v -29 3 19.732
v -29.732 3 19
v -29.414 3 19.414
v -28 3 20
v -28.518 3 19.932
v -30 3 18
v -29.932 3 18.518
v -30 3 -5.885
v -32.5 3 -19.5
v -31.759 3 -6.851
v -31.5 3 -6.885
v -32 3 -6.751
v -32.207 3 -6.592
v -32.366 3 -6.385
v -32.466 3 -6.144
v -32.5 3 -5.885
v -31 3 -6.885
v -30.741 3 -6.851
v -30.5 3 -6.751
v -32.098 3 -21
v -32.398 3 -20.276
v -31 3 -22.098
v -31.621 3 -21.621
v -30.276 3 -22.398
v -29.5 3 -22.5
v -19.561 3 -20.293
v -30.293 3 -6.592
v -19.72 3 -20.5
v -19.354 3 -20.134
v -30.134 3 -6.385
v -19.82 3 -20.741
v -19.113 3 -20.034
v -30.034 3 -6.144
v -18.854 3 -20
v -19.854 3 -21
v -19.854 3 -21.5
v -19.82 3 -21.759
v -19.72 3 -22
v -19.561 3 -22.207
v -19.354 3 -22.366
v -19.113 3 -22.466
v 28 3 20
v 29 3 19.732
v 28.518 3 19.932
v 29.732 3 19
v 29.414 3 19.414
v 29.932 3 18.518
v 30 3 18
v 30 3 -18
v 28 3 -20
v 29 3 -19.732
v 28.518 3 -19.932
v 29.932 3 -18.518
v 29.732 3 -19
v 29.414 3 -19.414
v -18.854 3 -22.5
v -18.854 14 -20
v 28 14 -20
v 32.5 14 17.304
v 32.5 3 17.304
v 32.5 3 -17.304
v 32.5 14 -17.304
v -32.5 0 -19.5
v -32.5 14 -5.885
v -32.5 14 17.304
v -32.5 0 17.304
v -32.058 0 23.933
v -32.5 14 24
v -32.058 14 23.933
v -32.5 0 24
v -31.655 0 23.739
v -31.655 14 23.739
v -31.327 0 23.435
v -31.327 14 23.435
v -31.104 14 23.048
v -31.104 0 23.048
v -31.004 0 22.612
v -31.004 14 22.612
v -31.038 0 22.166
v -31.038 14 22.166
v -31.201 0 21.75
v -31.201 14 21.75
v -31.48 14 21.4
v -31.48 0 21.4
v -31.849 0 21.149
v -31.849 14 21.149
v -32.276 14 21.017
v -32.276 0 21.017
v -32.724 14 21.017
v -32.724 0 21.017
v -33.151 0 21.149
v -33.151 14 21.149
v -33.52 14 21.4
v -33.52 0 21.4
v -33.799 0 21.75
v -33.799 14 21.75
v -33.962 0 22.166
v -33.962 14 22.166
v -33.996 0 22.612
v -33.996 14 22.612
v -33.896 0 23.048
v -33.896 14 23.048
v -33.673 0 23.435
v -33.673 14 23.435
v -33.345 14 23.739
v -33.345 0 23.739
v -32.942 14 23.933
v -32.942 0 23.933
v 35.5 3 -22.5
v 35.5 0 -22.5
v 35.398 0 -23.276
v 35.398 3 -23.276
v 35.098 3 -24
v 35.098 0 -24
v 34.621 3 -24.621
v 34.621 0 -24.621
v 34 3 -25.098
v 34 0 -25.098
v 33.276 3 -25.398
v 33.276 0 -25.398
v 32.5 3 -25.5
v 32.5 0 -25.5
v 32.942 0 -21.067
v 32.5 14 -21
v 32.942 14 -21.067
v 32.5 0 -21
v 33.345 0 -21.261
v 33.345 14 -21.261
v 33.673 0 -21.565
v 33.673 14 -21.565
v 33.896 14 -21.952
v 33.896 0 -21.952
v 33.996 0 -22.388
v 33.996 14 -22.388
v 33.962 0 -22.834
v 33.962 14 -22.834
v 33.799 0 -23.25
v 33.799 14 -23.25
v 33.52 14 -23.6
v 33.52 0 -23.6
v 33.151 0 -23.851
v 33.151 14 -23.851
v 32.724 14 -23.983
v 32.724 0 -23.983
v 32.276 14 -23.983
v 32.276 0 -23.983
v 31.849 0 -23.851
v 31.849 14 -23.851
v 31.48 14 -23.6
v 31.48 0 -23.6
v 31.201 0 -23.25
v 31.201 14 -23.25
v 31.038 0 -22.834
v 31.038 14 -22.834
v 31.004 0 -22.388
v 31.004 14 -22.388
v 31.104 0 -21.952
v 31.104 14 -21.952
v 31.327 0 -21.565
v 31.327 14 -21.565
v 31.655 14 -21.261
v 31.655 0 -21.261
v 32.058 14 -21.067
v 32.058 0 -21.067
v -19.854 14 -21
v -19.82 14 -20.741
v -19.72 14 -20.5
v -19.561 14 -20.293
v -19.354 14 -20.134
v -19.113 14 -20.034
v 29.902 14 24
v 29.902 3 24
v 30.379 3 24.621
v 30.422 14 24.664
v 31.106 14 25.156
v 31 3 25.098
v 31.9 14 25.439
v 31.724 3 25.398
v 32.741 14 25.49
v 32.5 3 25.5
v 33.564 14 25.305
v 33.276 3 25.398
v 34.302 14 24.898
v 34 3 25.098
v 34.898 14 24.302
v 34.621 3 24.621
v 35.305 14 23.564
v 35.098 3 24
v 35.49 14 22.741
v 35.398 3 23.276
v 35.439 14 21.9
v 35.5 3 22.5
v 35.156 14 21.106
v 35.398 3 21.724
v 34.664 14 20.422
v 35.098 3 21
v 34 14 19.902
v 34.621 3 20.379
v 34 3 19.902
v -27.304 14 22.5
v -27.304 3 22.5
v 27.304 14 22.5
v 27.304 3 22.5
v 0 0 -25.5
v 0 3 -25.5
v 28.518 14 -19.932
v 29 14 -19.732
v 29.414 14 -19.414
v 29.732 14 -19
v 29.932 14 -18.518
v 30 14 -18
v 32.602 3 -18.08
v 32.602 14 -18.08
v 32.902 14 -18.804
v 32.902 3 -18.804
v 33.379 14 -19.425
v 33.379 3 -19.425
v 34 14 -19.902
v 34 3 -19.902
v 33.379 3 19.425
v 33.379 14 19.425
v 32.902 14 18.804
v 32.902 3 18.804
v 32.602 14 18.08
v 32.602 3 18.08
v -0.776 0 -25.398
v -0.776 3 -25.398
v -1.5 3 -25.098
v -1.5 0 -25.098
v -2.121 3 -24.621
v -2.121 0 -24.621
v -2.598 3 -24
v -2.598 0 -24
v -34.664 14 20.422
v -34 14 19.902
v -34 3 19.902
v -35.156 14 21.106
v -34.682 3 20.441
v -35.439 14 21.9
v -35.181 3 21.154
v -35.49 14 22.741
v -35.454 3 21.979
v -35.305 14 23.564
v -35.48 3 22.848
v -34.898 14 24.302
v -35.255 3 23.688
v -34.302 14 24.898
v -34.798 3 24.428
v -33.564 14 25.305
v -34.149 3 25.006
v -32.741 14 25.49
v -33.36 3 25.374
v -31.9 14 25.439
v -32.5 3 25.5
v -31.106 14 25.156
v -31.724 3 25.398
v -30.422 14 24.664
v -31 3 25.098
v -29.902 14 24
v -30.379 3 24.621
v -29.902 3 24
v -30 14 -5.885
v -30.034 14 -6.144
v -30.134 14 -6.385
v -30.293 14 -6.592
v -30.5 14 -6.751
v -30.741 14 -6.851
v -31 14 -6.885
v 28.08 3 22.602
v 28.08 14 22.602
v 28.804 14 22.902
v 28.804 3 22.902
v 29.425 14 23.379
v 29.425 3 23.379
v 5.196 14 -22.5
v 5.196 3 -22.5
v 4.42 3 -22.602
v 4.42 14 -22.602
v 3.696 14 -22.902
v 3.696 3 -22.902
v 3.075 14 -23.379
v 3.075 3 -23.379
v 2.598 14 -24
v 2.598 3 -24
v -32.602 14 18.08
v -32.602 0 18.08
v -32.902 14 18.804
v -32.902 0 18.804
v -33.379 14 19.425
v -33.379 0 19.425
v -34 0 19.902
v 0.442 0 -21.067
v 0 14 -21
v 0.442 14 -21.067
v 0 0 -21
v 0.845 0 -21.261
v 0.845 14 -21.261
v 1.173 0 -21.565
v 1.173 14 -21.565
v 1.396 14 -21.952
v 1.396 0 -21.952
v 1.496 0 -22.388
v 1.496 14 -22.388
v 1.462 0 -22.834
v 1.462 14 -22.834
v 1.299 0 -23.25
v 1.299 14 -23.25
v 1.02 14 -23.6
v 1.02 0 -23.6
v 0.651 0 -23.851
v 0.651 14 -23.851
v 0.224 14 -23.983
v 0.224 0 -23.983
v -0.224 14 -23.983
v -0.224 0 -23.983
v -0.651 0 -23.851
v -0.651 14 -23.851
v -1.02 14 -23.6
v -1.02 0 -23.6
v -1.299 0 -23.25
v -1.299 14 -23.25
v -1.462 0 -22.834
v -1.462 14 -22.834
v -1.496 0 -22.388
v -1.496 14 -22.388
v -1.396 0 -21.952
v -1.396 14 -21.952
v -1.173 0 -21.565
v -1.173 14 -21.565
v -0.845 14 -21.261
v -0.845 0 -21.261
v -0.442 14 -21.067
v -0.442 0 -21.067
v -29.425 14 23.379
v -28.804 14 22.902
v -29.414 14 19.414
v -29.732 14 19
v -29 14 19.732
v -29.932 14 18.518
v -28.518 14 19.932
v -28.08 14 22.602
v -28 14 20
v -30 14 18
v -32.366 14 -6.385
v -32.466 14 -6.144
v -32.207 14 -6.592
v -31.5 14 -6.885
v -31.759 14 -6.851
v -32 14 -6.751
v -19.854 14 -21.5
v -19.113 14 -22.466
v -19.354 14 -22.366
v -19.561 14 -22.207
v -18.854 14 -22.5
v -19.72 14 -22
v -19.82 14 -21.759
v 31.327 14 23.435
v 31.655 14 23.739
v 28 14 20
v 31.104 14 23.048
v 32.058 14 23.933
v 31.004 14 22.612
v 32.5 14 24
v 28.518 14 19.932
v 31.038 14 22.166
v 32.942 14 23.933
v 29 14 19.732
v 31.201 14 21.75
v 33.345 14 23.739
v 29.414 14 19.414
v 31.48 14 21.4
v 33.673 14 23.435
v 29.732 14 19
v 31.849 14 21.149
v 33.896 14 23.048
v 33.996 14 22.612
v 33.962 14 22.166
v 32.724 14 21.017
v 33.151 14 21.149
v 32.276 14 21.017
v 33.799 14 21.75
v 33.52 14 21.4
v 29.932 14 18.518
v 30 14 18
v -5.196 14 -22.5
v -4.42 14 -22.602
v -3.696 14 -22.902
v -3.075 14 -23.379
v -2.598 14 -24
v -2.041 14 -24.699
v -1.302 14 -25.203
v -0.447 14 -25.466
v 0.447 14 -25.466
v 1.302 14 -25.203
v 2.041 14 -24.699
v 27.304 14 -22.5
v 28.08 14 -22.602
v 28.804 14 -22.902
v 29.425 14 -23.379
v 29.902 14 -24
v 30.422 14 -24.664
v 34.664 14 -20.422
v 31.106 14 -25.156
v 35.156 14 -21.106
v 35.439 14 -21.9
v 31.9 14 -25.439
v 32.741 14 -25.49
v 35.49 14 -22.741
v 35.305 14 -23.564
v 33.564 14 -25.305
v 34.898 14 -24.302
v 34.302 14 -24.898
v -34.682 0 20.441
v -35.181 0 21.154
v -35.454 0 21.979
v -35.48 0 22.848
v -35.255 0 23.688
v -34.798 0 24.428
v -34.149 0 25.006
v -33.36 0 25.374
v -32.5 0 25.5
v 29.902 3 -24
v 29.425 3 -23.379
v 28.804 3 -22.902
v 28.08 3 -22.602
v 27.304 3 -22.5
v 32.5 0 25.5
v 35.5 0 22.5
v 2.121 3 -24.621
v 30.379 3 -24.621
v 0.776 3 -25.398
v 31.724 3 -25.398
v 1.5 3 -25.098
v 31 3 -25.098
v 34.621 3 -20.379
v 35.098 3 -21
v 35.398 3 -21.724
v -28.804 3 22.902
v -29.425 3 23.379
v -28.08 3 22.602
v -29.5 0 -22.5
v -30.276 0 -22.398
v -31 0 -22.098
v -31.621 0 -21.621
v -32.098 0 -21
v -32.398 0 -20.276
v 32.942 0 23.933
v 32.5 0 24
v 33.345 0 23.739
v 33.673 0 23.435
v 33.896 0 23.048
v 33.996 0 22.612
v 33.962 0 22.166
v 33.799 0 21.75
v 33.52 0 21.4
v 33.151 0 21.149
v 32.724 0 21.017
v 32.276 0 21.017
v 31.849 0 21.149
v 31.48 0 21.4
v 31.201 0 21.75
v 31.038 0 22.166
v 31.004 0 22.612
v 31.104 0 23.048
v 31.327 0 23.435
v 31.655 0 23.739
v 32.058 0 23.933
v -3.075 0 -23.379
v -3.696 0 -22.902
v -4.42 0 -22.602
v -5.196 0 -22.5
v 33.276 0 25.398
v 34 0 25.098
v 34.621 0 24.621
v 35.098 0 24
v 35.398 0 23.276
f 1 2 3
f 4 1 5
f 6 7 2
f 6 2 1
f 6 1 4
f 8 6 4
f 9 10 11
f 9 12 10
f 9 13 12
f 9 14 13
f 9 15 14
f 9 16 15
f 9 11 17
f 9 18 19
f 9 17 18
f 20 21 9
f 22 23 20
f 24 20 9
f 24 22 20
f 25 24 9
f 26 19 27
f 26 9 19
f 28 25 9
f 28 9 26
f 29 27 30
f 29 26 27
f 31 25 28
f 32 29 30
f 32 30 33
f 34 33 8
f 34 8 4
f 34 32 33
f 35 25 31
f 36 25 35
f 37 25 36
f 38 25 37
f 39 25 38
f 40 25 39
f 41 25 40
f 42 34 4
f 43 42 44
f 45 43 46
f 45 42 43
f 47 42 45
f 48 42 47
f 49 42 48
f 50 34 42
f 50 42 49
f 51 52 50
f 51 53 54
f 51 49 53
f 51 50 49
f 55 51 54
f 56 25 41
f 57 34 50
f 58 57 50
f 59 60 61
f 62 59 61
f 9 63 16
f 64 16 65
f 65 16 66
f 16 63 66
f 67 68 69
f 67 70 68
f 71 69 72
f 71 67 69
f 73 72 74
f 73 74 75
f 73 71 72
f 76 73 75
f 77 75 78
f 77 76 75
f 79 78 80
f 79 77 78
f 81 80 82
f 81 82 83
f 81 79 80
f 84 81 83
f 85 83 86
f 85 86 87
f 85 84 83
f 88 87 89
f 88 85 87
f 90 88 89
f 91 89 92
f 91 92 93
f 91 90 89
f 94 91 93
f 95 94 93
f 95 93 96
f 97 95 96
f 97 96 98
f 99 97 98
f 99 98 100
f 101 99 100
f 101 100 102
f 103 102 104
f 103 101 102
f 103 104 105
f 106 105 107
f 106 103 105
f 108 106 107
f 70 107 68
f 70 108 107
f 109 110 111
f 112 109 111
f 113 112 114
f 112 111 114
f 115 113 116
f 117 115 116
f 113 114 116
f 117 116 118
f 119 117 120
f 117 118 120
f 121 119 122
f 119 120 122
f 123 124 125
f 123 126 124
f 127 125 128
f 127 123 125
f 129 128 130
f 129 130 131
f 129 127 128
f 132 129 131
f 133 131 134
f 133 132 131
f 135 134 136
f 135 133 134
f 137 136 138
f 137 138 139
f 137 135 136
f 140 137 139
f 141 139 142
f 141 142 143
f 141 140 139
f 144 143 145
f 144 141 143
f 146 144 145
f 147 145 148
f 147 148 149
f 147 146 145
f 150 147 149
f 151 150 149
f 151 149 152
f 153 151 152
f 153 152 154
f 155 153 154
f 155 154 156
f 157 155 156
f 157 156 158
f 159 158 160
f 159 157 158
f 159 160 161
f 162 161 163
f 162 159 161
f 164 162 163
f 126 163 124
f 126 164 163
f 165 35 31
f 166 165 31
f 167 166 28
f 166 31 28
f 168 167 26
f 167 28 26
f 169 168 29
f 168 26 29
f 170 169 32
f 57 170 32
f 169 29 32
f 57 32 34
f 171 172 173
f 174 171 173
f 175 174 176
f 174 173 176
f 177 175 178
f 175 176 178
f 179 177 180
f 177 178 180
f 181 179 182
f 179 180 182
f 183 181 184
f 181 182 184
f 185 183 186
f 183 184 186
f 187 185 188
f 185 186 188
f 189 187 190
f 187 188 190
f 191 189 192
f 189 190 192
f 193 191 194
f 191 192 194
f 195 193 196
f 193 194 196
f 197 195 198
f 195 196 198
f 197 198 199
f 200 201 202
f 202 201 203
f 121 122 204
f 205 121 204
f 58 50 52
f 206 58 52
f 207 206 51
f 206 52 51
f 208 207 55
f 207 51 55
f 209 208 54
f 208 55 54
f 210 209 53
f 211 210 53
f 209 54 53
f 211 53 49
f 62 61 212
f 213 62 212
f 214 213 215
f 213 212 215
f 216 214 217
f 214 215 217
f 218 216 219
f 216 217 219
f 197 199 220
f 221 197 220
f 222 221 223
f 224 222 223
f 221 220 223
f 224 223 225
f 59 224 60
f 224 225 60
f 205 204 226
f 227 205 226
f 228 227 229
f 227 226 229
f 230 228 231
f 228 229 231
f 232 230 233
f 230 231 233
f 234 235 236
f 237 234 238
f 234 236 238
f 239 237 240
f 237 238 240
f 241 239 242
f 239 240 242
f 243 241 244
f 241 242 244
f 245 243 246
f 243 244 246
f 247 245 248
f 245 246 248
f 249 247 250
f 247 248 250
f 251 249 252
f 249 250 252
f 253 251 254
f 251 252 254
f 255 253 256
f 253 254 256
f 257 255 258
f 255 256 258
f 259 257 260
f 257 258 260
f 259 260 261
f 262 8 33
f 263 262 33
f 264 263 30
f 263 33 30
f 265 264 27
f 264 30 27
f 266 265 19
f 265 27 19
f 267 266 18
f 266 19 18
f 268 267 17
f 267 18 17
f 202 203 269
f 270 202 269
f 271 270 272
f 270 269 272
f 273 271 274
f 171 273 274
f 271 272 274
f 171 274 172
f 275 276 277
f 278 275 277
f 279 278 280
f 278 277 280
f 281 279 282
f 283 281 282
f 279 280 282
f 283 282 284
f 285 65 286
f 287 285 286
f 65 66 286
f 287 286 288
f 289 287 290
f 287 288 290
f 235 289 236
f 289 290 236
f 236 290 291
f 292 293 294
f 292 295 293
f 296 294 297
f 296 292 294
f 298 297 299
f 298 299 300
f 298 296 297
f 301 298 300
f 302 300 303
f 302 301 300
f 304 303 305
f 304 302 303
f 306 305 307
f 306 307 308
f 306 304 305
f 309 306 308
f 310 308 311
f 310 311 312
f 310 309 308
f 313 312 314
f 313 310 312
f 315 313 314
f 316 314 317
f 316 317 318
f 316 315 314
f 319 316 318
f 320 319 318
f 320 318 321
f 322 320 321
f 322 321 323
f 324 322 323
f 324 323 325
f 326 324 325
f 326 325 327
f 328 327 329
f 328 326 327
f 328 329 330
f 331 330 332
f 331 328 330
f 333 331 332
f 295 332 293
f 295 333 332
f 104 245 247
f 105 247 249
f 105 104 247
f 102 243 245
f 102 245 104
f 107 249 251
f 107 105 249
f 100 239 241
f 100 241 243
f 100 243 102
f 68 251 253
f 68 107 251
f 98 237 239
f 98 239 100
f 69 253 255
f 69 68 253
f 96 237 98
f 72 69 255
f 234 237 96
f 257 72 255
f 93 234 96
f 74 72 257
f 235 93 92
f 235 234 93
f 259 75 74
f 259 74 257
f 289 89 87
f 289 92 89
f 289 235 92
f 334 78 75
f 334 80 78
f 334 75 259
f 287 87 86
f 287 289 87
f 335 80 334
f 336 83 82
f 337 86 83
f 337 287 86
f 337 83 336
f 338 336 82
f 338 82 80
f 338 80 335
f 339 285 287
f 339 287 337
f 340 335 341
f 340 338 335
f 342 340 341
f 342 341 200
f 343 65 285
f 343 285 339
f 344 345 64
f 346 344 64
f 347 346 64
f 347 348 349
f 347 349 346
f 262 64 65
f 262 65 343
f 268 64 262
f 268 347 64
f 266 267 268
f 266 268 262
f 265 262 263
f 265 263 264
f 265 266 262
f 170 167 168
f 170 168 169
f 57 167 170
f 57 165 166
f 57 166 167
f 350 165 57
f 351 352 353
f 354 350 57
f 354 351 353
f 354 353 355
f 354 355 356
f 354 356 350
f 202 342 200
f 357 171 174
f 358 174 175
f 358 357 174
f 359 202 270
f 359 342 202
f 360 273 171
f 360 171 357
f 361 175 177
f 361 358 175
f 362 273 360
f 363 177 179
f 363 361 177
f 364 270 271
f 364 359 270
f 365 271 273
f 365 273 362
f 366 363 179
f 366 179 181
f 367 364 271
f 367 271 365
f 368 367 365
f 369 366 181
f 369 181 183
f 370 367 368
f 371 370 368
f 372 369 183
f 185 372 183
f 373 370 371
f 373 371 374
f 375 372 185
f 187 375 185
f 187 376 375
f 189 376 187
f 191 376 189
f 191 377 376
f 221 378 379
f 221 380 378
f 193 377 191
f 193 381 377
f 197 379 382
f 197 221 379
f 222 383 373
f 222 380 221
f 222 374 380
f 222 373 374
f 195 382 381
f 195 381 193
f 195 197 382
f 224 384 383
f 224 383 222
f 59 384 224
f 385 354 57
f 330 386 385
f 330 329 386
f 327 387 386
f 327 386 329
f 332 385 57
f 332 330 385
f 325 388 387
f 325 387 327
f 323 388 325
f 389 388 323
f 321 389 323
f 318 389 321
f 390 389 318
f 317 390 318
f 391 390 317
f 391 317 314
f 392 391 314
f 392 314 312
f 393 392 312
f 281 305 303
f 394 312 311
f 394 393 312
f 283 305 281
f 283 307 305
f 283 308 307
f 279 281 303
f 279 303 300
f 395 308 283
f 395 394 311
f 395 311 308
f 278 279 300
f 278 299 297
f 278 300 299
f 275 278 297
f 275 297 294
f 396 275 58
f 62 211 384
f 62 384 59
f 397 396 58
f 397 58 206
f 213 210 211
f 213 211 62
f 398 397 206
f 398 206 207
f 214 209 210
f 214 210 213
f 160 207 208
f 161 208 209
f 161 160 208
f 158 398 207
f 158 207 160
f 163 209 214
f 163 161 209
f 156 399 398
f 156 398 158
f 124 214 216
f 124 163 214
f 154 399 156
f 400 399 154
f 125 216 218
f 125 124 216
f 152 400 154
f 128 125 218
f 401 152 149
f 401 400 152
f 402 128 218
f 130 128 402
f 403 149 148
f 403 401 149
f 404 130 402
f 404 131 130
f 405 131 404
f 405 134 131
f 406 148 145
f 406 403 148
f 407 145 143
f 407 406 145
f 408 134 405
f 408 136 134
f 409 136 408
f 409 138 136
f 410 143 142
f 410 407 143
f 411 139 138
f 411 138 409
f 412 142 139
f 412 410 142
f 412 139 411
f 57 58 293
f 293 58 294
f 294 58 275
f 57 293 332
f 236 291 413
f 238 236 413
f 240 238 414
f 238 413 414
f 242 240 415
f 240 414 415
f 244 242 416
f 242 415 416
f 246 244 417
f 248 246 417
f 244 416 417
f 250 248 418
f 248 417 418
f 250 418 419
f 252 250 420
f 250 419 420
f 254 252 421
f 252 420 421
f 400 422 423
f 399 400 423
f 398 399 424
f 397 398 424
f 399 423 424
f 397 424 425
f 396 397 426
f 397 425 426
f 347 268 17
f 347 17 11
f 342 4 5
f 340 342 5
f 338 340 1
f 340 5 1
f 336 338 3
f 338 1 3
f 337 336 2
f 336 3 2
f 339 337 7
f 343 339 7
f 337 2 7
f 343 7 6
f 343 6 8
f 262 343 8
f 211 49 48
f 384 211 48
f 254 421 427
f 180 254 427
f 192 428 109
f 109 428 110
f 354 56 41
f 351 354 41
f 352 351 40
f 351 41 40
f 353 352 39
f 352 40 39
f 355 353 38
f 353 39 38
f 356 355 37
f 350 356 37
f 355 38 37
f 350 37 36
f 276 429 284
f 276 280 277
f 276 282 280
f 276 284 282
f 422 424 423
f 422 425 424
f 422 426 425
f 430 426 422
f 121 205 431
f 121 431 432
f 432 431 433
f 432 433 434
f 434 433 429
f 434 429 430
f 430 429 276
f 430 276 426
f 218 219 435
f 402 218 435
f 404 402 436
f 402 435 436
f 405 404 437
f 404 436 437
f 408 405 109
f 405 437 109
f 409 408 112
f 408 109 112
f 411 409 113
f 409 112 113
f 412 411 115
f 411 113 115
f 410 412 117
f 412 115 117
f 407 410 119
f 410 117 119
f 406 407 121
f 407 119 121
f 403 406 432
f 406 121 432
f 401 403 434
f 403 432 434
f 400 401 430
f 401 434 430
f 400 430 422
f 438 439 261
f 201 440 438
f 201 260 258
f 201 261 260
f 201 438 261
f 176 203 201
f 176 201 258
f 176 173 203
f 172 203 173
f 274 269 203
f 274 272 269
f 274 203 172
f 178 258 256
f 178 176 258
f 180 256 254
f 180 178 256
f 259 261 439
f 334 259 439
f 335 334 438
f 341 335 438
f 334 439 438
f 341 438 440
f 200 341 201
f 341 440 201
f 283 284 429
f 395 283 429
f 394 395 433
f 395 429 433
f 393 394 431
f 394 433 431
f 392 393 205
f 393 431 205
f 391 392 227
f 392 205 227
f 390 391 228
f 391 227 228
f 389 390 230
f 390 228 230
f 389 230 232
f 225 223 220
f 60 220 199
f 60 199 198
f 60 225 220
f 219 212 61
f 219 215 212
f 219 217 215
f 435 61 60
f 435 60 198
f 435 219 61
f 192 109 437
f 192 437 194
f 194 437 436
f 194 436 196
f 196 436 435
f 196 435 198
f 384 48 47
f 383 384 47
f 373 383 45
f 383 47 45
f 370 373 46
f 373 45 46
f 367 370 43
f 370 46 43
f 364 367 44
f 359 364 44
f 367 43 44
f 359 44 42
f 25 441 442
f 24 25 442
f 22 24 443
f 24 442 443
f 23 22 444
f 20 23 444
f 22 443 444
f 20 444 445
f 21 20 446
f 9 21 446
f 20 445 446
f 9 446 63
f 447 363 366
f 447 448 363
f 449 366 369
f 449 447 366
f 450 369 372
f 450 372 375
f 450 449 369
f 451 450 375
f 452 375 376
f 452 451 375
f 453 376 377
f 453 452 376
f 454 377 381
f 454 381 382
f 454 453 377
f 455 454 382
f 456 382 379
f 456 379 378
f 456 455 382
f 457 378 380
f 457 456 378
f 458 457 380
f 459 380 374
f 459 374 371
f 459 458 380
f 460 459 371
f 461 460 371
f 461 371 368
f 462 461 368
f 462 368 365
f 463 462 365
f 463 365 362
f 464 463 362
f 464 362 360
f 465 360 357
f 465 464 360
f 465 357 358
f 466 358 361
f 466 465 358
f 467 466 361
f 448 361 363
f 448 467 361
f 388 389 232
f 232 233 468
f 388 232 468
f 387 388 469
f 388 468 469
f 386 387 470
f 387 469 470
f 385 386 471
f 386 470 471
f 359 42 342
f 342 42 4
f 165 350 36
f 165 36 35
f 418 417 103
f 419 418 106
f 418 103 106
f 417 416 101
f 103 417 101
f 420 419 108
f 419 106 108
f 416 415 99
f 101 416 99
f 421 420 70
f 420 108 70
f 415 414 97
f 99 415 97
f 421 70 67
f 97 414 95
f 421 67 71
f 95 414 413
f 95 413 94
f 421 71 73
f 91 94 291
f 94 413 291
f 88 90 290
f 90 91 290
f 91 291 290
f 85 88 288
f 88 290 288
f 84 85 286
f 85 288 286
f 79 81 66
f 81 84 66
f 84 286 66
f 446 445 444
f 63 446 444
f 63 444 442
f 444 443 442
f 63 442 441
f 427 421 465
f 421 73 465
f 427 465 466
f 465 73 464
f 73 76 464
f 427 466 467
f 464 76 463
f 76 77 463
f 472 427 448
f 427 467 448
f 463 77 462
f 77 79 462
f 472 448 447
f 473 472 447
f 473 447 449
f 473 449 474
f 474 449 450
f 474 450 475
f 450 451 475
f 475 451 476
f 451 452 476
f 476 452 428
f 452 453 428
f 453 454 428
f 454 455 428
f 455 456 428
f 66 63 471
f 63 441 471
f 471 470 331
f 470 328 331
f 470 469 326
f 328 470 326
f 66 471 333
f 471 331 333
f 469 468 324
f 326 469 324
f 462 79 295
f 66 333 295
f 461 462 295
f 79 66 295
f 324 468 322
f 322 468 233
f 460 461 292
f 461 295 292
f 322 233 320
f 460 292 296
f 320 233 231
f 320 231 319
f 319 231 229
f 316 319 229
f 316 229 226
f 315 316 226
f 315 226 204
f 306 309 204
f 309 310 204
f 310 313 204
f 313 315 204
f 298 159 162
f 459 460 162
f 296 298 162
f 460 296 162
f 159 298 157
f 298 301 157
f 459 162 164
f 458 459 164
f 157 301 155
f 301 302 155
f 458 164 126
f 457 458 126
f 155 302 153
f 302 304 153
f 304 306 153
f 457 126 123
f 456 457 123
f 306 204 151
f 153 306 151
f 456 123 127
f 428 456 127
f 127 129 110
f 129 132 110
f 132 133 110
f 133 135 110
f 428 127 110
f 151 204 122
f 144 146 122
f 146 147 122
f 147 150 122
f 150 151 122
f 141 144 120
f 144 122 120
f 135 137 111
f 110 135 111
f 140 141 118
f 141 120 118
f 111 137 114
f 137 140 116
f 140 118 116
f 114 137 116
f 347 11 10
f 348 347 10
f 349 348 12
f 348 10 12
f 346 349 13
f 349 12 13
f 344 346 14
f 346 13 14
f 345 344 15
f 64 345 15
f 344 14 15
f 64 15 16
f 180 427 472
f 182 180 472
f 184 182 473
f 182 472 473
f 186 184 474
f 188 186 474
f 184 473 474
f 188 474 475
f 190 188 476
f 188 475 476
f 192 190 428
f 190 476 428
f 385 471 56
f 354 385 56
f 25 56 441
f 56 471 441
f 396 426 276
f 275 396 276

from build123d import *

# Parameters (mm, degrees)
SKETCH5_R           = 1.5
BOSS_EXTRUDE2_DEPTH = 3
SKETCH6_R           = 1.5
BOSS_EXTRUDE3_DEPTH = 11


with BuildPart() as part:
    # Sketch5 → Boss-Extrude2 (new body)
    with BuildSketch(Plane(origin=(0, 0, 0), x_dir=(1, 0, 0), z_dir=(0, 1, 0))):
        with BuildLine():
            Line((-5.196152423, 22.5), (-29.5, 22.5))
            ThreePointArc((-29.5, 22.5), (-31.621320344, 21.621320344), (-32.5, 19.5))
            Line((-32.5, 19.5), (-32.5, -17.303847577))
            ThreePointArc((-32.5, -17.303847577), (-32.901923789, -18.803847577), (-34, -19.901923789))
            ThreePointArc((-34, -19.901923789), (-35.397777479, -23.276457135), (-32.5, -25.5))
            Line((-32.5, -25.5), (32.5, -25.5))
            ThreePointArc((32.5, -25.5), (34.621320344, -24.621320344), (35.5, -22.5))
            Line((35.5, -22.5), (35.5, 22.5))
            ThreePointArc((35.5, 22.5), (34.621320344, 24.621320344), (32.5, 25.5))
            Line((32.5, 25.5), (0, 25.5))
            ThreePointArc((0, 25.5), (-1.5, 25.098076211), (-2.598076211, 24))
            ThreePointArc((-2.598076211, 24), (-3.696152423, 22.901923789), (-5.196152423, 22.5))
        make_face()
        with Locations(Location((0, 22.5, 0), (0, 0, 270))):
            Circle(SKETCH5_R, mode=Mode.SUBTRACT)
        with Locations(Location((32.5, 22.5, 0), (0, 0, 270))):
            Circle(SKETCH5_R, mode=Mode.SUBTRACT)
        with Locations(Location((32.5, -22.5, 0), (0, 0, 270))):
            Circle(SKETCH5_R, mode=Mode.SUBTRACT)
        with Locations(Location((-32.5, -22.5, 0), (0, 0, 270))):
            Circle(SKETCH5_R, mode=Mode.SUBTRACT)
    extrude(amount=BOSS_EXTRUDE2_DEPTH)

    # Sketch6 → Boss-Extrude3 (add)
    with BuildSketch(Plane(origin=(0, 3, 0), x_dir=(1, 0, 0), z_dir=(0, 1, 0))):
        with BuildLine():
            Line((-32.5, 5.885087138), (-32.5, -17.303847577))
            ThreePointArc((-32.5, -17.303847577), (-32.901923789, -18.803847577), (-34, -19.901923789))
            ThreePointArc((-34, -19.901923789), (-34.621320344, -24.621320344), (-29.901923789, -24))
            ThreePointArc((-29.901923789, -24), (-28.803847577, -22.901923789), (-27.303847577, -22.5))
            Line((-27.303847577, -22.5), (27.303847577, -22.5))
            ThreePointArc((27.303847577, -22.5), (28.803847577, -22.901923789), (29.901923789, -24))
            ThreePointArc((29.901923789, -24), (34.621320344, -24.621320344), (34, -19.901923789))
            ThreePointArc((34, -19.901923789), (32.901923789, -18.803847577), (32.5, -17.303847577))
            Line((32.5, -17.303847577), (32.5, 17.303847577))
            ThreePointArc((32.5, 17.303847577), (32.901923789, 18.803847577), (34, 19.901923789))
            ThreePointArc((34, 19.901923789), (34.621320344, 24.621320344), (29.901923789, 24))
            ThreePointArc((29.901923789, 24), (28.803847577, 22.901923789), (27.303847577, 22.5))
            Line((27.303847577, 22.5), (5.196152423, 22.5))
            ThreePointArc((5.196152423, 22.5), (3.696152423, 22.901923789), (2.598076211, 24))
            ThreePointArc((2.598076211, 24), (0, 25.5), (-2.598076211, 24))
            ThreePointArc((-2.598076211, 24), (-3.696152423, 22.901923789), (-5.196152423, 22.5))
            Line((-5.196152423, 22.5), (-18.854157071, 22.5))
            ThreePointArc((-18.854157071, 22.5), (-19.561263852, 22.207106781), (-19.854157071, 21.5))
            Line((-19.854157071, 21.5), (-19.854157071, 21))
            ThreePointArc((-19.854157071, 21), (-19.561263852, 20.292893219), (-18.854157071, 20))
            Line((-18.854157071, 20), (28, 20))
            ThreePointArc((28, 20), (29.414213562, 19.414213562), (30, 18))
            Line((30, 18), (30, -18))
            ThreePointArc((30, -18), (29.414213562, -19.414213562), (28, -20))
            Line((28, -20), (-28, -20))
            ThreePointArc((-28, -20), (-29.414213562, -19.414213562), (-30, -18))
            Line((-30, -18), (-30, 5.885087138))
            ThreePointArc((-30, 5.885087138), (-30.292893219, 6.592193919), (-31, 6.885087138))
            Line((-31, 6.885087138), (-31.5, 6.885087138))
            ThreePointArc((-31.5, 6.885087138), (-32.207106781, 6.592193919), (-32.5, 5.885087138))
        make_face()
        with Locations(Location((0, 22.5, 0), (0, 0, 270))):
            Circle(SKETCH6_R, mode=Mode.SUBTRACT)
        with Locations(Location((32.5, 22.5, 0), (0, 0, 270))):
            Circle(SKETCH6_R, mode=Mode.SUBTRACT)
        with Locations(Location((32.5, -22.5, 0), (0, 0, 270))):
            Circle(SKETCH6_R, mode=Mode.SUBTRACT)
        with Locations(Location((-32.5, -22.5, 0), (0, 0, 270))):
            Circle(SKETCH6_R, mode=Mode.SUBTRACT)
    extrude(amount=BOSS_EXTRUDE3_DEPTH)


solid = part.part
